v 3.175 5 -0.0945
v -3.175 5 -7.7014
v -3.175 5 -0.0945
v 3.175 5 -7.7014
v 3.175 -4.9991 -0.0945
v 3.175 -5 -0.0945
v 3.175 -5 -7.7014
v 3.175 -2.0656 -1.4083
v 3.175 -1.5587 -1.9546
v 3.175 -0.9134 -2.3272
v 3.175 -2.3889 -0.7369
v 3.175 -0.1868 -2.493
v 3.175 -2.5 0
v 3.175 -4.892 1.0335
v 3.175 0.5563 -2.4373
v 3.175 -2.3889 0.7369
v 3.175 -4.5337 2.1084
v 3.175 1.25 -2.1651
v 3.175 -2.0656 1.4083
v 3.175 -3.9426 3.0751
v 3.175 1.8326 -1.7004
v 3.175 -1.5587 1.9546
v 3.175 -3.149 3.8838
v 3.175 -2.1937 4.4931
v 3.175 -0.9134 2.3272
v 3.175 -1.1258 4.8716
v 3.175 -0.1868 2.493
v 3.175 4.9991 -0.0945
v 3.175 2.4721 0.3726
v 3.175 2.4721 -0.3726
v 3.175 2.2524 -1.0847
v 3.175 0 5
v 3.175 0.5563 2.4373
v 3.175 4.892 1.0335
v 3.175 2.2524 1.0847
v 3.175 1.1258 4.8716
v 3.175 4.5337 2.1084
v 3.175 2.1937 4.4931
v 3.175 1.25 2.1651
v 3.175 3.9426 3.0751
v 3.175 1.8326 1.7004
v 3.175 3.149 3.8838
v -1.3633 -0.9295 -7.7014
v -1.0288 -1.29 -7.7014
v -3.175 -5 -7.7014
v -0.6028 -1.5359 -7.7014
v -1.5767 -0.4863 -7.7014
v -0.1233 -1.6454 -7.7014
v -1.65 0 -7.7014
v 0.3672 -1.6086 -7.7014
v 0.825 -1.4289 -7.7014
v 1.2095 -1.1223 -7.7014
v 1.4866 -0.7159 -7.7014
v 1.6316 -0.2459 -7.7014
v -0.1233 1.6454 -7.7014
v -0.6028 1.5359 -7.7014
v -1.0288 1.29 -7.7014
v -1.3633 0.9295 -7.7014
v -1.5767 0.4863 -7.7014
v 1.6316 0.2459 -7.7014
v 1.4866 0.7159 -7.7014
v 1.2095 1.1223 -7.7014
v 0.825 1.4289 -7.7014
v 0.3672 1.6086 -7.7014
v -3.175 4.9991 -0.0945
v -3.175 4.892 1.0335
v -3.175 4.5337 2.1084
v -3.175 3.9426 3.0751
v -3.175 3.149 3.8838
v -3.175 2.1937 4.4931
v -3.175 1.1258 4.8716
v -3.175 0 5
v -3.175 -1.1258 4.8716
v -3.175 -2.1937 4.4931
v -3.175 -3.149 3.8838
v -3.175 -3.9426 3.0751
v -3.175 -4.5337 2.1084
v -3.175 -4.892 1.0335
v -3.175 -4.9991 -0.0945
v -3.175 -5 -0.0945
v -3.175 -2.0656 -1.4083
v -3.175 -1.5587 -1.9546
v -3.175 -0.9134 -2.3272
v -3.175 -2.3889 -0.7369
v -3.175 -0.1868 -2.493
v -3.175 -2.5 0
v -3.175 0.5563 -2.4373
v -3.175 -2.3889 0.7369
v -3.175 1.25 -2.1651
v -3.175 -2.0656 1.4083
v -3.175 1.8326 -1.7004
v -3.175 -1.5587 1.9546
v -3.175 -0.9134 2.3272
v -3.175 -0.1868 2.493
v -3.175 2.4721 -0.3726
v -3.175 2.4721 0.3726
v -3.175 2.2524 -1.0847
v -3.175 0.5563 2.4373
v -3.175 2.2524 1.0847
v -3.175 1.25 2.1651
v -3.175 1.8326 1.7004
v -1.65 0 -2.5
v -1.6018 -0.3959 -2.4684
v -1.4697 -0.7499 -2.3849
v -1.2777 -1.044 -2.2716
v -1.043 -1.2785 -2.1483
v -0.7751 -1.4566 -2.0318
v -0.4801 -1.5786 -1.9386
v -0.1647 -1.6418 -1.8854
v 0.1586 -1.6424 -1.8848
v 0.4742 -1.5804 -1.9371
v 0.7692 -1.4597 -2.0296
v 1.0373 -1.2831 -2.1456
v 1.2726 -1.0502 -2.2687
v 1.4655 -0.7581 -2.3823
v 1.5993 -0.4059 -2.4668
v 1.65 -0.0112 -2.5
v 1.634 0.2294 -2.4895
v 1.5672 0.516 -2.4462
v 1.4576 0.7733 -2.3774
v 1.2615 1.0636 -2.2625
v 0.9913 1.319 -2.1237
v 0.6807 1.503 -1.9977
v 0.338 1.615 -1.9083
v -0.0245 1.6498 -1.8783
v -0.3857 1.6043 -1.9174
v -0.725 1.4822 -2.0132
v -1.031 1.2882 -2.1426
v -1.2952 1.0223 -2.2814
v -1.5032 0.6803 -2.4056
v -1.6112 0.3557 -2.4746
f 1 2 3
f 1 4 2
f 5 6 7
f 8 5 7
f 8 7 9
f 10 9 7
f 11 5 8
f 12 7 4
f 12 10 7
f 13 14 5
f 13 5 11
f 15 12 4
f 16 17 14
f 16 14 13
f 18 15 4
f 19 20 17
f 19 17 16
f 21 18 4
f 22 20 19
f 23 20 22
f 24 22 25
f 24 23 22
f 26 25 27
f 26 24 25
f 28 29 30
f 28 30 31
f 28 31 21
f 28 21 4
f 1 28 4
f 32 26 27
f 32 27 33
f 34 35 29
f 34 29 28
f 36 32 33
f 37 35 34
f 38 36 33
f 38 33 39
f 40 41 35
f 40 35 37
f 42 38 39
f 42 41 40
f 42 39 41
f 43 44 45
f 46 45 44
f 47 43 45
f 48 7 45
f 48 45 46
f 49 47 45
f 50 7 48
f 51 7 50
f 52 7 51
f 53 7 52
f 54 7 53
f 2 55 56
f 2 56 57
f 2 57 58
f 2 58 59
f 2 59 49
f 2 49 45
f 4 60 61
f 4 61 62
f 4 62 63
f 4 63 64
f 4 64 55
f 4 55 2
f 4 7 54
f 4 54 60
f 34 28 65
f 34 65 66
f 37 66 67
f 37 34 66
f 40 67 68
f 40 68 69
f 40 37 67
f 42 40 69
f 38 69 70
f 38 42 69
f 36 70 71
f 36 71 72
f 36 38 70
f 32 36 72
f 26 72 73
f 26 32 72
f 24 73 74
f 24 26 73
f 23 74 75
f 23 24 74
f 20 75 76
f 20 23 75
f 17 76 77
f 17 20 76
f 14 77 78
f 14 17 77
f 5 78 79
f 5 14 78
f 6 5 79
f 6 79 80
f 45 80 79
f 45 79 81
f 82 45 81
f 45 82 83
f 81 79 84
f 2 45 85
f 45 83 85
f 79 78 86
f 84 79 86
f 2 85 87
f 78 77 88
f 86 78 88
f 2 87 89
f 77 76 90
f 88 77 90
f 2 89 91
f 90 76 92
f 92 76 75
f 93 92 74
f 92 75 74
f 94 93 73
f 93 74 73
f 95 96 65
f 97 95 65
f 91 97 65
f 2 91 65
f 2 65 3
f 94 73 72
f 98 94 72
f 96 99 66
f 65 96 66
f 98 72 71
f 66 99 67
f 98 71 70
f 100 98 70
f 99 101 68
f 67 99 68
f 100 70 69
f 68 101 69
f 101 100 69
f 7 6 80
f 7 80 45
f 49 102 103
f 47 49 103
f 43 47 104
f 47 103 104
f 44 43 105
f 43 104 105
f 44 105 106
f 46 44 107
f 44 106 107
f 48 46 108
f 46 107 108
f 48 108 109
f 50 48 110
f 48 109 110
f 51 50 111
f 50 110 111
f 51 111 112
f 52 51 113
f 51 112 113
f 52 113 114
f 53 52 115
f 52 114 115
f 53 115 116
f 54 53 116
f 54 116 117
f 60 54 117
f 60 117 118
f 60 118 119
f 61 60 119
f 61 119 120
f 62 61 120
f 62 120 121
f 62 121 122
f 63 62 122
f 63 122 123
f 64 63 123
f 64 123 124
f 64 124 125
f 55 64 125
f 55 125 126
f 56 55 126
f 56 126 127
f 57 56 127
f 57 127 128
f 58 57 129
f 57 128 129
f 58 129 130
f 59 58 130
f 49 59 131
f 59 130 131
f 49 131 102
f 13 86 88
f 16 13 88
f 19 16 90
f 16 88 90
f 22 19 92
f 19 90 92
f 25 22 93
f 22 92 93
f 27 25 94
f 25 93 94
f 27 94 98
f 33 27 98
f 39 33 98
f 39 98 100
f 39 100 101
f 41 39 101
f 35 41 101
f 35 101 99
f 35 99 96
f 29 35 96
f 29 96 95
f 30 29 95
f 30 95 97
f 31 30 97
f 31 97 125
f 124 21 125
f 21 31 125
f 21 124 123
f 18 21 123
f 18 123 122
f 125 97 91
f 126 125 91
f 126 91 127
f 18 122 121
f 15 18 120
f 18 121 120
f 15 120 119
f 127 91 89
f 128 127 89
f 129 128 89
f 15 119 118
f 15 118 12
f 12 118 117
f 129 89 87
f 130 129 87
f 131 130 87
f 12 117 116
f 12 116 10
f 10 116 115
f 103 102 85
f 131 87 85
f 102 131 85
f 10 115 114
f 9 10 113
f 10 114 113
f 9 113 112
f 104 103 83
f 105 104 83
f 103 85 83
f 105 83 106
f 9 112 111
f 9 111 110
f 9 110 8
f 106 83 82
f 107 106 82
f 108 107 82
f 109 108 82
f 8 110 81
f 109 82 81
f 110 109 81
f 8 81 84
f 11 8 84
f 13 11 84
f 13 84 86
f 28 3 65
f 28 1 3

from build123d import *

# Parameters (mm, degrees)
F1_DEPTH = 3.175
F3_D     = 5
F5_D     = 3.3
F5_DEPTH = 6
F5_TIP   = 0.9914200214


with BuildPart() as f1:
    # F0 (on Right) → F1 (new body, symmetric)
    with BuildSketch(Plane.YZ):
        with BuildLine():
            Line((5, -0.0944561325), (4.9991077243, -0.0944561325))
            ThreePointArc((4.9991077243, -0.0944561325), (0, 5), (-4.9991077243, -0.0944561325))
            Line((-4.9991077243, -0.0944561325), (-5, -0.0944561325))
            Line((-5, -0.0944561325), (-5, -7.7014281414))
            Line((-5, -7.7014281414), (5, -7.7014281414))
            Line((5, -7.7014281414), (5, -0.0944561325))
        make_face()
    extrude(amount=F1_DEPTH, both=True)

    # F3 (through all)
    with Locations(Plane.YZ.offset(3.175)):
        with Locations((0, 0)):
            Hole(F3_D / 2)

    # F5
    with Locations(Plane(origin=(0, 0, -7.7014281414), x_dir=(1, 0, 0), z_dir=(0, 0, -1))):
        with Locations((0, 0)):
            Hole(F5_D / 2, depth=F5_DEPTH)
            with Locations((0, 0, -(F5_DEPTH + F5_TIP / 2))):  # 118° drill point
                Cone(0, F5_D / 2, F5_TIP, mode=Mode.SUBTRACT)


solid = f1.part
